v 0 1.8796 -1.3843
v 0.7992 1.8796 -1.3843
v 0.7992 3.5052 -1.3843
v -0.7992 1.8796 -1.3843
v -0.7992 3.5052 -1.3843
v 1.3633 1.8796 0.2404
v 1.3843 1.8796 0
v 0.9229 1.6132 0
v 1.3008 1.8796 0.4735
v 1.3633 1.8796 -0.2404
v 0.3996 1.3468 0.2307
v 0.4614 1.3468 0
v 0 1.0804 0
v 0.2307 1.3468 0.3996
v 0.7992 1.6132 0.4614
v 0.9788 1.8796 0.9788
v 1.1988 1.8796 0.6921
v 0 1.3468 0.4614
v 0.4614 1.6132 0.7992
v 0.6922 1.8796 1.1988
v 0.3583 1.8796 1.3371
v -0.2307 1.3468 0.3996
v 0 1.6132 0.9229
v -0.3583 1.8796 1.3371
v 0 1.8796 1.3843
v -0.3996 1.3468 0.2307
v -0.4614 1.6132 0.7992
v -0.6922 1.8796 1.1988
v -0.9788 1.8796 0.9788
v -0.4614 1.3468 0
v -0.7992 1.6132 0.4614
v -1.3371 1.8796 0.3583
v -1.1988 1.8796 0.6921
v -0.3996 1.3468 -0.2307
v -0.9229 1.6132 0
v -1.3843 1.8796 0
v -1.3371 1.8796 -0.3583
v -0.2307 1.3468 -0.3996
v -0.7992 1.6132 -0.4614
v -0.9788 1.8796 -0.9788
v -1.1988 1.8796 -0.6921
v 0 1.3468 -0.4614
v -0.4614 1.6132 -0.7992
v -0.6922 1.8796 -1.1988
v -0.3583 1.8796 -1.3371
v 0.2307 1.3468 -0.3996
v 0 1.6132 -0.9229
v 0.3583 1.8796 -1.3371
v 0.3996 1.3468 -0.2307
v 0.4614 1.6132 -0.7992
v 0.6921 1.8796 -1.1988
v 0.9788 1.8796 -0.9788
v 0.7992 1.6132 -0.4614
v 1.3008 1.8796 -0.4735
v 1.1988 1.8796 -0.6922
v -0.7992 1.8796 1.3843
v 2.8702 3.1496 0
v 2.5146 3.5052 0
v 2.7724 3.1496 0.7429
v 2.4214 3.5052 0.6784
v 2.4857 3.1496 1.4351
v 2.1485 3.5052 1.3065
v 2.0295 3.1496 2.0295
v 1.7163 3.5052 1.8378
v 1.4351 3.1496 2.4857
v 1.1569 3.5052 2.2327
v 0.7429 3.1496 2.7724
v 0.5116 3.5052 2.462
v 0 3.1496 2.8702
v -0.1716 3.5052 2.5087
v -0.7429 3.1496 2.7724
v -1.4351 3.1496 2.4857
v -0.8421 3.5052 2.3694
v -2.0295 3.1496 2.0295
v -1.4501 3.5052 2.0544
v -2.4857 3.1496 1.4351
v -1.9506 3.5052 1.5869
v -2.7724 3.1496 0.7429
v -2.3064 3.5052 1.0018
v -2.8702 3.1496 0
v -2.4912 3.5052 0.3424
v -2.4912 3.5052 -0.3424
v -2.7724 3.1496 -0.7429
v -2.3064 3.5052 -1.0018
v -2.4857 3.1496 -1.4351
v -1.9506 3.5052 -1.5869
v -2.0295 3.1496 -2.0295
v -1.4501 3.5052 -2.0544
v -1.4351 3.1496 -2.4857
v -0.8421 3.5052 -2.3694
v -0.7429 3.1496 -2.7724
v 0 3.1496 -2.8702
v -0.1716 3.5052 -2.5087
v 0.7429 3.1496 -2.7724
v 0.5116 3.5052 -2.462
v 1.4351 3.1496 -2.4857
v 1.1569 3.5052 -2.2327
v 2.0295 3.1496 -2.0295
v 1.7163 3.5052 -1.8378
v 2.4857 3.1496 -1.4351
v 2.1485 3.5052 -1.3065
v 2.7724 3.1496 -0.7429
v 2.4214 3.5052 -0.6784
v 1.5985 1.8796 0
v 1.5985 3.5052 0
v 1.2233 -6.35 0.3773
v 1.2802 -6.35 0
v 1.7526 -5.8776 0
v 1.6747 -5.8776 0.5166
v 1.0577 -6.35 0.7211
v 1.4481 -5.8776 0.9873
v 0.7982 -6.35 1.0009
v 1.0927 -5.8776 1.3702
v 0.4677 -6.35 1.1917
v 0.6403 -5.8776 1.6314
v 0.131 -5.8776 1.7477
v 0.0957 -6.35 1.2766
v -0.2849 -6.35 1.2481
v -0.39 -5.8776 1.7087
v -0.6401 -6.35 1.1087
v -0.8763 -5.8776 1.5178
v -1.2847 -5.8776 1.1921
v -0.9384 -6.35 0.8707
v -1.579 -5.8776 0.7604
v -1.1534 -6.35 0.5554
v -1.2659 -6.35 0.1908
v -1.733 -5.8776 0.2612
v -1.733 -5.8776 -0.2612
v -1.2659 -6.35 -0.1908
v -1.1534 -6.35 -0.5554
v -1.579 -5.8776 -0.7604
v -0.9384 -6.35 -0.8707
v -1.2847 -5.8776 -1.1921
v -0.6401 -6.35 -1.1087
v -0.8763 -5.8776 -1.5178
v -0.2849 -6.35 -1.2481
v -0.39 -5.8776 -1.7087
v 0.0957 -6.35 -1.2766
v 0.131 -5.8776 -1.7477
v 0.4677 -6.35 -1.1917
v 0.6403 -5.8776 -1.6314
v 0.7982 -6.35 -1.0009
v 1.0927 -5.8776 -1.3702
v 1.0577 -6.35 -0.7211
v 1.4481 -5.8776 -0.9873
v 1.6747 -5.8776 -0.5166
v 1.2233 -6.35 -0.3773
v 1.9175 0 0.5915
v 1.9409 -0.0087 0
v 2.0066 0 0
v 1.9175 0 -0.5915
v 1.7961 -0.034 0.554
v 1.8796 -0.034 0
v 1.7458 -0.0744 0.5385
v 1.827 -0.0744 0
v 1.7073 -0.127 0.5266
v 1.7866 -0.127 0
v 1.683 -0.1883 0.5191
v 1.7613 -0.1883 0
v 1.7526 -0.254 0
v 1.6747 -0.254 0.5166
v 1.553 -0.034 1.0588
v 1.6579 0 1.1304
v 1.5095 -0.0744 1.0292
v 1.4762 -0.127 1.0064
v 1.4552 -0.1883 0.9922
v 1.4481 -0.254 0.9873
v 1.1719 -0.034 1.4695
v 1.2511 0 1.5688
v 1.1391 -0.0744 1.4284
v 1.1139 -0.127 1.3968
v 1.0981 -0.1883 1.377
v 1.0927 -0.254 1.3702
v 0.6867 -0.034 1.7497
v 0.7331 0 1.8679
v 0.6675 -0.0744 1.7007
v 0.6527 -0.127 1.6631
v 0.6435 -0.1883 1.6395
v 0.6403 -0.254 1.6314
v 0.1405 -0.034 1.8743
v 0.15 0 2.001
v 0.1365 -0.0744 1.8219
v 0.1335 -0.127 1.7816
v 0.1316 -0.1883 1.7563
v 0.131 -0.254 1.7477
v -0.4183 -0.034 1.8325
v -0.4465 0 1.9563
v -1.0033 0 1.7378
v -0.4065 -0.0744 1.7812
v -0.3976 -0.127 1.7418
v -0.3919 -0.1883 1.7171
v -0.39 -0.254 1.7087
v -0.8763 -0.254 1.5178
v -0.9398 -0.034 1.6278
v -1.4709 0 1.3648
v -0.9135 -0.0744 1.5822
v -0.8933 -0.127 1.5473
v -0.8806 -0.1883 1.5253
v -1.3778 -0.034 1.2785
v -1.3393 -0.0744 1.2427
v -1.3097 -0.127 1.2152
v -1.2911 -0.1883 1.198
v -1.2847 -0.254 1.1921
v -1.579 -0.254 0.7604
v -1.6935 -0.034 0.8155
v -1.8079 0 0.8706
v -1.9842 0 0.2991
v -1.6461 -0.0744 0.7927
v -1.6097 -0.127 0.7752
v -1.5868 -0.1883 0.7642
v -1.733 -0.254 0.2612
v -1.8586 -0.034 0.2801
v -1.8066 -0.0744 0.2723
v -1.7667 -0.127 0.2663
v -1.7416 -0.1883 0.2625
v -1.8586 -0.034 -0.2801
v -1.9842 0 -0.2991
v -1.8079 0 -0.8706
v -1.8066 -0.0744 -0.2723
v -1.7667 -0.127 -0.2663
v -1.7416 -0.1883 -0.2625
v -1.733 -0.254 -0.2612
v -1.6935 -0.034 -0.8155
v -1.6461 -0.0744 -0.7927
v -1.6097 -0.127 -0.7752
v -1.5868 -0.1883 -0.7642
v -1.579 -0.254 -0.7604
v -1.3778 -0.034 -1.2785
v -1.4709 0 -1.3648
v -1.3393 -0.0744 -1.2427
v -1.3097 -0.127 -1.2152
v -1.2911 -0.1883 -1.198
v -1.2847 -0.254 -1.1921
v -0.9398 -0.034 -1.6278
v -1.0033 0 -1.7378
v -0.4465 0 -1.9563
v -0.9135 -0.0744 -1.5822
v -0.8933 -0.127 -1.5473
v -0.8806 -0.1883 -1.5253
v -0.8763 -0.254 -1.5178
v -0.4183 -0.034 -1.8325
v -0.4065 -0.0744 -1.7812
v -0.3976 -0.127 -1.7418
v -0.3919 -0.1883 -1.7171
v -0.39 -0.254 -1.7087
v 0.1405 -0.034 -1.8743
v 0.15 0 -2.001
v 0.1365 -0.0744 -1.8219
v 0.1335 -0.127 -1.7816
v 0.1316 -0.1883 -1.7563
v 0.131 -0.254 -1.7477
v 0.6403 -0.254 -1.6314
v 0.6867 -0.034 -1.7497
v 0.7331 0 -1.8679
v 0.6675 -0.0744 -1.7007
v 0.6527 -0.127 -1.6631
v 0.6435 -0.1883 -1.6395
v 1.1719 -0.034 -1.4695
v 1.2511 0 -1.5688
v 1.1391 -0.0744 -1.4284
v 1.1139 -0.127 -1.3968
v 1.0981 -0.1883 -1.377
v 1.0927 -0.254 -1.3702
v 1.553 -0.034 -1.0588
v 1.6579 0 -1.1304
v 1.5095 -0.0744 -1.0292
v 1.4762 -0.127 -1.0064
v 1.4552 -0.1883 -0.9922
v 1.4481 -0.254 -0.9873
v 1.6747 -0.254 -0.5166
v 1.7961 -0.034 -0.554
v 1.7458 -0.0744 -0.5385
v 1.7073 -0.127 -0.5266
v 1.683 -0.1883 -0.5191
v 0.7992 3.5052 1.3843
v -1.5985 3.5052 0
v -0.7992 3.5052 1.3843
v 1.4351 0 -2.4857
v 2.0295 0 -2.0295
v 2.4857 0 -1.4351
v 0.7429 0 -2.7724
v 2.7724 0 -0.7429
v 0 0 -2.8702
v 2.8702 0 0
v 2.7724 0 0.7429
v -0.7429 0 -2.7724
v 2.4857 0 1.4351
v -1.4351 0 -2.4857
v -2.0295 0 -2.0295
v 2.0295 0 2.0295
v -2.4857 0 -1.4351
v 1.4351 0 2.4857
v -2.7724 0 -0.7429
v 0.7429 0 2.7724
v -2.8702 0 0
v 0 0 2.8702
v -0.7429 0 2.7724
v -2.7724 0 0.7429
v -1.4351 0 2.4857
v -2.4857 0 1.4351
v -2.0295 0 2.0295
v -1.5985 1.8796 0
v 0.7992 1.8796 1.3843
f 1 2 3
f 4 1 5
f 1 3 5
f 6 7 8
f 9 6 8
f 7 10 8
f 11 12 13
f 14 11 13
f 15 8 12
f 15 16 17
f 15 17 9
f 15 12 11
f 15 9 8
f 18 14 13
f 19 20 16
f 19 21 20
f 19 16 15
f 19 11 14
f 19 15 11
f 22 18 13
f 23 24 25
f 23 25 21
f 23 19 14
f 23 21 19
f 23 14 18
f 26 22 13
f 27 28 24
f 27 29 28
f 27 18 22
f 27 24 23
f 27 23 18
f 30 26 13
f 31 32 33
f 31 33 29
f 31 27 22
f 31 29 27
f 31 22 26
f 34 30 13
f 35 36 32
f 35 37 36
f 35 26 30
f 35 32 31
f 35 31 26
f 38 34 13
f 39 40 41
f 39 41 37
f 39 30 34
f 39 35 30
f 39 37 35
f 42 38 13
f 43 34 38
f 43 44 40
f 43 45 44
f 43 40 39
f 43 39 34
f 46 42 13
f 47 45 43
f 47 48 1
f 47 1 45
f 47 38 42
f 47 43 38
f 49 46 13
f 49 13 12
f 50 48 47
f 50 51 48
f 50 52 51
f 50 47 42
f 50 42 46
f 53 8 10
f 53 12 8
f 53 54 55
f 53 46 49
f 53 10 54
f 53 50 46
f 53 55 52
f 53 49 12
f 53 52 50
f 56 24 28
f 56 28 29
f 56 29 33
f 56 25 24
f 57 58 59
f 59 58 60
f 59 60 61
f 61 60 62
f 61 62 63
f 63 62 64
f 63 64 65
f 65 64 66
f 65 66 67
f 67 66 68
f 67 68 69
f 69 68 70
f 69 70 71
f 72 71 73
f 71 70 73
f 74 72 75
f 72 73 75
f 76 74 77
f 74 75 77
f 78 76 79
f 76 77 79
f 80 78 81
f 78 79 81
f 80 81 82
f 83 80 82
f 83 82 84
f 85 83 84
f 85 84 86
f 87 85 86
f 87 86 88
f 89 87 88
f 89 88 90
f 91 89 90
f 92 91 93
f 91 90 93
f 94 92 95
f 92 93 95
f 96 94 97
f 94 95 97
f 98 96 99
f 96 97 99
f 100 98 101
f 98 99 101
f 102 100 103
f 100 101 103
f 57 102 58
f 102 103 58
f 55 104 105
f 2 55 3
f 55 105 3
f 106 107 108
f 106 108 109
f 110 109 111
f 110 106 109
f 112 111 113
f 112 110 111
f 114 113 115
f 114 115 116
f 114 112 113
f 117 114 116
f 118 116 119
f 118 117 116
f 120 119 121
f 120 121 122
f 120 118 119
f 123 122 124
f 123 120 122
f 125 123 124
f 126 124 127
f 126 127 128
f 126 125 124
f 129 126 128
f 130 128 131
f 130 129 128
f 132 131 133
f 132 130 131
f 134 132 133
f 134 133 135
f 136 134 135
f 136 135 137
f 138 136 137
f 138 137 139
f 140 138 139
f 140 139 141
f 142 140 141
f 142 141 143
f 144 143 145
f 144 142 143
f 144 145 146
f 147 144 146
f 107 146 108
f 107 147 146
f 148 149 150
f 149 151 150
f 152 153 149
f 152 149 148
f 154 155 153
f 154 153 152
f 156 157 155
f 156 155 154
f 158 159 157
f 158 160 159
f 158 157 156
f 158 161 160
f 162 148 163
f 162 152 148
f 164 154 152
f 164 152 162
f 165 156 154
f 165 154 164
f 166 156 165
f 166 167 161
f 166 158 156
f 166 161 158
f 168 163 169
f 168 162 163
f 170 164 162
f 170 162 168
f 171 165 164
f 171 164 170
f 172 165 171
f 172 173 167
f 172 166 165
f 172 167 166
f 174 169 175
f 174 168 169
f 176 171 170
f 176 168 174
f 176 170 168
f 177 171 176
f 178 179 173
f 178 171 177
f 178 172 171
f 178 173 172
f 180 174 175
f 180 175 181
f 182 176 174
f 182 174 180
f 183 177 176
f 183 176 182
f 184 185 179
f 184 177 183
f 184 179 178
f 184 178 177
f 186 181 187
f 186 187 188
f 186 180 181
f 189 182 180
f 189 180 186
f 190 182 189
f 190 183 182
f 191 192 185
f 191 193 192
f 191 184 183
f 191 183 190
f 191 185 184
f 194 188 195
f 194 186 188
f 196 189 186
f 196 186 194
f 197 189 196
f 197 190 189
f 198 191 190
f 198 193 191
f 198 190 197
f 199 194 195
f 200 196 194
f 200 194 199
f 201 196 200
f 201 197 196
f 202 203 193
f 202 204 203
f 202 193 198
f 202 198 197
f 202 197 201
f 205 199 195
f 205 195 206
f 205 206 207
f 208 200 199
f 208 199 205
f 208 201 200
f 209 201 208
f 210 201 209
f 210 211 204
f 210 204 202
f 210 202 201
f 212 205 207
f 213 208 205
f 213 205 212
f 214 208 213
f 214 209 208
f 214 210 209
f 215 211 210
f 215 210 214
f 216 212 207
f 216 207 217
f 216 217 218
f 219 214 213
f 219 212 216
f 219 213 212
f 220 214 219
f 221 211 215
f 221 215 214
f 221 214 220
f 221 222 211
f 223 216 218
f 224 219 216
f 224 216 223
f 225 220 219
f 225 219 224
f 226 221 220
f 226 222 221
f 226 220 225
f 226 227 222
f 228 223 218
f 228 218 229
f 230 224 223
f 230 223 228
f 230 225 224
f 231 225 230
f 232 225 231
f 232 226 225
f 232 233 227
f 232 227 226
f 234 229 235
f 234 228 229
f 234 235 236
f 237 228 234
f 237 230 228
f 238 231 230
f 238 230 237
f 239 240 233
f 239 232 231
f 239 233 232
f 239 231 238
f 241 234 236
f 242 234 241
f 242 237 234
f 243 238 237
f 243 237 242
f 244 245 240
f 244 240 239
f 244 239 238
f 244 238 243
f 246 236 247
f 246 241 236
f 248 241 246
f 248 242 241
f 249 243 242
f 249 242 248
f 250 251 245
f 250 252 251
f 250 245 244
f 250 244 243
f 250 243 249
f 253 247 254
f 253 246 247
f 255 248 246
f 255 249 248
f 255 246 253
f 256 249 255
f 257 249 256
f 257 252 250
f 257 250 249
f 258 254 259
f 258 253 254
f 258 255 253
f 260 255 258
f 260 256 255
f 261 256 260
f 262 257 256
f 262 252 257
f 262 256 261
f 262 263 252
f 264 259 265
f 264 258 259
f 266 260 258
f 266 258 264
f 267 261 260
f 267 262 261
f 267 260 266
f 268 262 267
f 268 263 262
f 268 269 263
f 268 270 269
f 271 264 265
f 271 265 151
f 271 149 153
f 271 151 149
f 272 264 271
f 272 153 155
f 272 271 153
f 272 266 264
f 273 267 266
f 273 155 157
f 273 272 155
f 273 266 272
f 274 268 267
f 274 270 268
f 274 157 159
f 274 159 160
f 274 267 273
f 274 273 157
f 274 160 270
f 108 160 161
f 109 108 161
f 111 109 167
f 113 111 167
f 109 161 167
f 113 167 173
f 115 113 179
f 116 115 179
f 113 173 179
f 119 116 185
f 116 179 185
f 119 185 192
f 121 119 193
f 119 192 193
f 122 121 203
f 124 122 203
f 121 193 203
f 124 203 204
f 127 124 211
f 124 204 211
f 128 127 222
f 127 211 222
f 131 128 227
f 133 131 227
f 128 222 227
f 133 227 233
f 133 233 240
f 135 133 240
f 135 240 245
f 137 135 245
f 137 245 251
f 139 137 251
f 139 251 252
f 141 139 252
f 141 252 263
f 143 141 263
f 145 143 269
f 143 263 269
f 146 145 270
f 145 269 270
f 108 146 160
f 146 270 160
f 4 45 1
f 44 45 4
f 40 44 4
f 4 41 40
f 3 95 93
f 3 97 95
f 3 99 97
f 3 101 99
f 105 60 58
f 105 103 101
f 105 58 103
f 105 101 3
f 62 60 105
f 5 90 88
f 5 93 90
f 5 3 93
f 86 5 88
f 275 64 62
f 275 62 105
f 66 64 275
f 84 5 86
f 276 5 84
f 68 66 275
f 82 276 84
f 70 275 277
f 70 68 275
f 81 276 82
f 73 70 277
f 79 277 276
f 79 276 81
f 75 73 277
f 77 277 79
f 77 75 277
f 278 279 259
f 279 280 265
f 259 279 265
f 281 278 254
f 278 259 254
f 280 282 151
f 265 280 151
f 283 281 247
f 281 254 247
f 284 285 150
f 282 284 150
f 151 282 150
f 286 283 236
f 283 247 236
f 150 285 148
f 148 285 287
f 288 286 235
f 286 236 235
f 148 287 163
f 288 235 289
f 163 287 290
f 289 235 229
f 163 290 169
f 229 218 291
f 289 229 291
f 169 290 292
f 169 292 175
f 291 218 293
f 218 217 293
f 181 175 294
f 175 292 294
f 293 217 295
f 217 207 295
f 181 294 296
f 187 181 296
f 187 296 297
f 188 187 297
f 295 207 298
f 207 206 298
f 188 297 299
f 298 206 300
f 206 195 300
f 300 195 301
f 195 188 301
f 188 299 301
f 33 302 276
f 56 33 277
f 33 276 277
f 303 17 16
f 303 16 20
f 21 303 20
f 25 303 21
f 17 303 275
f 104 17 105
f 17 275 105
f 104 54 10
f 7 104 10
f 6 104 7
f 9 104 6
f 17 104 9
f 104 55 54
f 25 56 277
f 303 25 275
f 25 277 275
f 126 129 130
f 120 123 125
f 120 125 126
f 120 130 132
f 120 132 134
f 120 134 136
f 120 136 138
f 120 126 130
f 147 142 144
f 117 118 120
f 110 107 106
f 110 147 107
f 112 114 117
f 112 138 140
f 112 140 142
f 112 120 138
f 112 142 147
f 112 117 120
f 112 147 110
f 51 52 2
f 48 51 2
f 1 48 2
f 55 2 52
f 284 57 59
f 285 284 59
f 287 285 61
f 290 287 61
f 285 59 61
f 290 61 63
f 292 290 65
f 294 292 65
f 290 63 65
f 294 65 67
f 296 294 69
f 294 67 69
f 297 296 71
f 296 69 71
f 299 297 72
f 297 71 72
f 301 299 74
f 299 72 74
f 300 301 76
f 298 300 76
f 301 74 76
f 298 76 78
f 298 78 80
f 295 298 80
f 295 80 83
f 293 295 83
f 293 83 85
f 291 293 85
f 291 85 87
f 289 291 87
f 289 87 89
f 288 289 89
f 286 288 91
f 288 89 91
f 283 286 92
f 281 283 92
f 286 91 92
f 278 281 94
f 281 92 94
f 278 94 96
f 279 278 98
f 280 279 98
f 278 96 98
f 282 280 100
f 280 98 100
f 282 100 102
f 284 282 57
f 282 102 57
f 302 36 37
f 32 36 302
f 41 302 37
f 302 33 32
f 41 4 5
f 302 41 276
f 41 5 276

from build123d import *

# Parameters (mm, degrees)
SKETCH1_W           = 2.8702
SKETCH1_H           = 3.5052
SKETCH2_R           = 1.7526
BOSS_EXTRUDE1_DEPTH = 6.35
CUT_EXTRUDE1_DEPTH  = 1.6256
CHAMFER1_SIZE       = 0.47244
CHAMFER2_SIZE       = 0.3556
FILLET1_R           = 0.254


with BuildPart() as part:
    # Sketch1 → Revolve1 (revolve)
    with BuildSketch(Plane.XY):
        with Locations((1.4351, 1.7526)):
            Rectangle(SKETCH1_W, SKETCH1_H)
    revolve(axis=Axis((0, 3.5052, 0), (0, -1, 0)))

    # Sketch2 → Boss-Extrude1 (add)
    with BuildSketch(Plane.XZ):
        Circle(SKETCH2_R)
    extrude(amount=BOSS_EXTRUDE1_DEPTH)

    # Sketch3 → Cut-Extrude1 (cut)
    with BuildSketch(Plane(origin=(0, 3.5052, 0), x_dir=(-1, 0, 0), z_dir=(0, 1, 0))):
        Polygon((-1.598451955, 0), (-0.799225978, -1.3843), (0.799225978, -1.3843), (1.598451955, 0), (0.799225978, 1.3843), (-0.799225978, 1.3843), align=None)
    extrude(amount=-CUT_EXTRUDE1_DEPTH, mode=Mode.SUBTRACT)

    # Sketch4 → Cut-Revolve1 (revolve, cut)
    with BuildSketch(Plane.XY):
        Polygon((1.3843, 1.8796), (0, 1.8796), (0, 1.080374022), align=None)
    revolve(axis=Axis((0, 1.8796, 0), (0, -1, 0)), mode=Mode.SUBTRACT)

    # Chamfer1
    chamfer1_edges = [part.edges().sort_by_distance(p)[0] for p in [
        (-1.7526, -6.35, 0),
    ]]
    chamfer(chamfer1_edges, length=CHAMFER1_SIZE)

    # Chamfer2
    chamfer2_edges = [part.edges().sort_by_distance(p)[0] for p in [
        (-2.8702, 3.5052, 0),
    ]]
    chamfer(chamfer2_edges, length=CHAMFER2_SIZE)

    # Fillet1
    fillet1_edges = [part.edges().sort_by_distance(p)[0] for p in [
        (-1.7526, 0, 0),
    ]]
    fillet(fillet1_edges, radius=FILLET1_R)


solid = part.part
